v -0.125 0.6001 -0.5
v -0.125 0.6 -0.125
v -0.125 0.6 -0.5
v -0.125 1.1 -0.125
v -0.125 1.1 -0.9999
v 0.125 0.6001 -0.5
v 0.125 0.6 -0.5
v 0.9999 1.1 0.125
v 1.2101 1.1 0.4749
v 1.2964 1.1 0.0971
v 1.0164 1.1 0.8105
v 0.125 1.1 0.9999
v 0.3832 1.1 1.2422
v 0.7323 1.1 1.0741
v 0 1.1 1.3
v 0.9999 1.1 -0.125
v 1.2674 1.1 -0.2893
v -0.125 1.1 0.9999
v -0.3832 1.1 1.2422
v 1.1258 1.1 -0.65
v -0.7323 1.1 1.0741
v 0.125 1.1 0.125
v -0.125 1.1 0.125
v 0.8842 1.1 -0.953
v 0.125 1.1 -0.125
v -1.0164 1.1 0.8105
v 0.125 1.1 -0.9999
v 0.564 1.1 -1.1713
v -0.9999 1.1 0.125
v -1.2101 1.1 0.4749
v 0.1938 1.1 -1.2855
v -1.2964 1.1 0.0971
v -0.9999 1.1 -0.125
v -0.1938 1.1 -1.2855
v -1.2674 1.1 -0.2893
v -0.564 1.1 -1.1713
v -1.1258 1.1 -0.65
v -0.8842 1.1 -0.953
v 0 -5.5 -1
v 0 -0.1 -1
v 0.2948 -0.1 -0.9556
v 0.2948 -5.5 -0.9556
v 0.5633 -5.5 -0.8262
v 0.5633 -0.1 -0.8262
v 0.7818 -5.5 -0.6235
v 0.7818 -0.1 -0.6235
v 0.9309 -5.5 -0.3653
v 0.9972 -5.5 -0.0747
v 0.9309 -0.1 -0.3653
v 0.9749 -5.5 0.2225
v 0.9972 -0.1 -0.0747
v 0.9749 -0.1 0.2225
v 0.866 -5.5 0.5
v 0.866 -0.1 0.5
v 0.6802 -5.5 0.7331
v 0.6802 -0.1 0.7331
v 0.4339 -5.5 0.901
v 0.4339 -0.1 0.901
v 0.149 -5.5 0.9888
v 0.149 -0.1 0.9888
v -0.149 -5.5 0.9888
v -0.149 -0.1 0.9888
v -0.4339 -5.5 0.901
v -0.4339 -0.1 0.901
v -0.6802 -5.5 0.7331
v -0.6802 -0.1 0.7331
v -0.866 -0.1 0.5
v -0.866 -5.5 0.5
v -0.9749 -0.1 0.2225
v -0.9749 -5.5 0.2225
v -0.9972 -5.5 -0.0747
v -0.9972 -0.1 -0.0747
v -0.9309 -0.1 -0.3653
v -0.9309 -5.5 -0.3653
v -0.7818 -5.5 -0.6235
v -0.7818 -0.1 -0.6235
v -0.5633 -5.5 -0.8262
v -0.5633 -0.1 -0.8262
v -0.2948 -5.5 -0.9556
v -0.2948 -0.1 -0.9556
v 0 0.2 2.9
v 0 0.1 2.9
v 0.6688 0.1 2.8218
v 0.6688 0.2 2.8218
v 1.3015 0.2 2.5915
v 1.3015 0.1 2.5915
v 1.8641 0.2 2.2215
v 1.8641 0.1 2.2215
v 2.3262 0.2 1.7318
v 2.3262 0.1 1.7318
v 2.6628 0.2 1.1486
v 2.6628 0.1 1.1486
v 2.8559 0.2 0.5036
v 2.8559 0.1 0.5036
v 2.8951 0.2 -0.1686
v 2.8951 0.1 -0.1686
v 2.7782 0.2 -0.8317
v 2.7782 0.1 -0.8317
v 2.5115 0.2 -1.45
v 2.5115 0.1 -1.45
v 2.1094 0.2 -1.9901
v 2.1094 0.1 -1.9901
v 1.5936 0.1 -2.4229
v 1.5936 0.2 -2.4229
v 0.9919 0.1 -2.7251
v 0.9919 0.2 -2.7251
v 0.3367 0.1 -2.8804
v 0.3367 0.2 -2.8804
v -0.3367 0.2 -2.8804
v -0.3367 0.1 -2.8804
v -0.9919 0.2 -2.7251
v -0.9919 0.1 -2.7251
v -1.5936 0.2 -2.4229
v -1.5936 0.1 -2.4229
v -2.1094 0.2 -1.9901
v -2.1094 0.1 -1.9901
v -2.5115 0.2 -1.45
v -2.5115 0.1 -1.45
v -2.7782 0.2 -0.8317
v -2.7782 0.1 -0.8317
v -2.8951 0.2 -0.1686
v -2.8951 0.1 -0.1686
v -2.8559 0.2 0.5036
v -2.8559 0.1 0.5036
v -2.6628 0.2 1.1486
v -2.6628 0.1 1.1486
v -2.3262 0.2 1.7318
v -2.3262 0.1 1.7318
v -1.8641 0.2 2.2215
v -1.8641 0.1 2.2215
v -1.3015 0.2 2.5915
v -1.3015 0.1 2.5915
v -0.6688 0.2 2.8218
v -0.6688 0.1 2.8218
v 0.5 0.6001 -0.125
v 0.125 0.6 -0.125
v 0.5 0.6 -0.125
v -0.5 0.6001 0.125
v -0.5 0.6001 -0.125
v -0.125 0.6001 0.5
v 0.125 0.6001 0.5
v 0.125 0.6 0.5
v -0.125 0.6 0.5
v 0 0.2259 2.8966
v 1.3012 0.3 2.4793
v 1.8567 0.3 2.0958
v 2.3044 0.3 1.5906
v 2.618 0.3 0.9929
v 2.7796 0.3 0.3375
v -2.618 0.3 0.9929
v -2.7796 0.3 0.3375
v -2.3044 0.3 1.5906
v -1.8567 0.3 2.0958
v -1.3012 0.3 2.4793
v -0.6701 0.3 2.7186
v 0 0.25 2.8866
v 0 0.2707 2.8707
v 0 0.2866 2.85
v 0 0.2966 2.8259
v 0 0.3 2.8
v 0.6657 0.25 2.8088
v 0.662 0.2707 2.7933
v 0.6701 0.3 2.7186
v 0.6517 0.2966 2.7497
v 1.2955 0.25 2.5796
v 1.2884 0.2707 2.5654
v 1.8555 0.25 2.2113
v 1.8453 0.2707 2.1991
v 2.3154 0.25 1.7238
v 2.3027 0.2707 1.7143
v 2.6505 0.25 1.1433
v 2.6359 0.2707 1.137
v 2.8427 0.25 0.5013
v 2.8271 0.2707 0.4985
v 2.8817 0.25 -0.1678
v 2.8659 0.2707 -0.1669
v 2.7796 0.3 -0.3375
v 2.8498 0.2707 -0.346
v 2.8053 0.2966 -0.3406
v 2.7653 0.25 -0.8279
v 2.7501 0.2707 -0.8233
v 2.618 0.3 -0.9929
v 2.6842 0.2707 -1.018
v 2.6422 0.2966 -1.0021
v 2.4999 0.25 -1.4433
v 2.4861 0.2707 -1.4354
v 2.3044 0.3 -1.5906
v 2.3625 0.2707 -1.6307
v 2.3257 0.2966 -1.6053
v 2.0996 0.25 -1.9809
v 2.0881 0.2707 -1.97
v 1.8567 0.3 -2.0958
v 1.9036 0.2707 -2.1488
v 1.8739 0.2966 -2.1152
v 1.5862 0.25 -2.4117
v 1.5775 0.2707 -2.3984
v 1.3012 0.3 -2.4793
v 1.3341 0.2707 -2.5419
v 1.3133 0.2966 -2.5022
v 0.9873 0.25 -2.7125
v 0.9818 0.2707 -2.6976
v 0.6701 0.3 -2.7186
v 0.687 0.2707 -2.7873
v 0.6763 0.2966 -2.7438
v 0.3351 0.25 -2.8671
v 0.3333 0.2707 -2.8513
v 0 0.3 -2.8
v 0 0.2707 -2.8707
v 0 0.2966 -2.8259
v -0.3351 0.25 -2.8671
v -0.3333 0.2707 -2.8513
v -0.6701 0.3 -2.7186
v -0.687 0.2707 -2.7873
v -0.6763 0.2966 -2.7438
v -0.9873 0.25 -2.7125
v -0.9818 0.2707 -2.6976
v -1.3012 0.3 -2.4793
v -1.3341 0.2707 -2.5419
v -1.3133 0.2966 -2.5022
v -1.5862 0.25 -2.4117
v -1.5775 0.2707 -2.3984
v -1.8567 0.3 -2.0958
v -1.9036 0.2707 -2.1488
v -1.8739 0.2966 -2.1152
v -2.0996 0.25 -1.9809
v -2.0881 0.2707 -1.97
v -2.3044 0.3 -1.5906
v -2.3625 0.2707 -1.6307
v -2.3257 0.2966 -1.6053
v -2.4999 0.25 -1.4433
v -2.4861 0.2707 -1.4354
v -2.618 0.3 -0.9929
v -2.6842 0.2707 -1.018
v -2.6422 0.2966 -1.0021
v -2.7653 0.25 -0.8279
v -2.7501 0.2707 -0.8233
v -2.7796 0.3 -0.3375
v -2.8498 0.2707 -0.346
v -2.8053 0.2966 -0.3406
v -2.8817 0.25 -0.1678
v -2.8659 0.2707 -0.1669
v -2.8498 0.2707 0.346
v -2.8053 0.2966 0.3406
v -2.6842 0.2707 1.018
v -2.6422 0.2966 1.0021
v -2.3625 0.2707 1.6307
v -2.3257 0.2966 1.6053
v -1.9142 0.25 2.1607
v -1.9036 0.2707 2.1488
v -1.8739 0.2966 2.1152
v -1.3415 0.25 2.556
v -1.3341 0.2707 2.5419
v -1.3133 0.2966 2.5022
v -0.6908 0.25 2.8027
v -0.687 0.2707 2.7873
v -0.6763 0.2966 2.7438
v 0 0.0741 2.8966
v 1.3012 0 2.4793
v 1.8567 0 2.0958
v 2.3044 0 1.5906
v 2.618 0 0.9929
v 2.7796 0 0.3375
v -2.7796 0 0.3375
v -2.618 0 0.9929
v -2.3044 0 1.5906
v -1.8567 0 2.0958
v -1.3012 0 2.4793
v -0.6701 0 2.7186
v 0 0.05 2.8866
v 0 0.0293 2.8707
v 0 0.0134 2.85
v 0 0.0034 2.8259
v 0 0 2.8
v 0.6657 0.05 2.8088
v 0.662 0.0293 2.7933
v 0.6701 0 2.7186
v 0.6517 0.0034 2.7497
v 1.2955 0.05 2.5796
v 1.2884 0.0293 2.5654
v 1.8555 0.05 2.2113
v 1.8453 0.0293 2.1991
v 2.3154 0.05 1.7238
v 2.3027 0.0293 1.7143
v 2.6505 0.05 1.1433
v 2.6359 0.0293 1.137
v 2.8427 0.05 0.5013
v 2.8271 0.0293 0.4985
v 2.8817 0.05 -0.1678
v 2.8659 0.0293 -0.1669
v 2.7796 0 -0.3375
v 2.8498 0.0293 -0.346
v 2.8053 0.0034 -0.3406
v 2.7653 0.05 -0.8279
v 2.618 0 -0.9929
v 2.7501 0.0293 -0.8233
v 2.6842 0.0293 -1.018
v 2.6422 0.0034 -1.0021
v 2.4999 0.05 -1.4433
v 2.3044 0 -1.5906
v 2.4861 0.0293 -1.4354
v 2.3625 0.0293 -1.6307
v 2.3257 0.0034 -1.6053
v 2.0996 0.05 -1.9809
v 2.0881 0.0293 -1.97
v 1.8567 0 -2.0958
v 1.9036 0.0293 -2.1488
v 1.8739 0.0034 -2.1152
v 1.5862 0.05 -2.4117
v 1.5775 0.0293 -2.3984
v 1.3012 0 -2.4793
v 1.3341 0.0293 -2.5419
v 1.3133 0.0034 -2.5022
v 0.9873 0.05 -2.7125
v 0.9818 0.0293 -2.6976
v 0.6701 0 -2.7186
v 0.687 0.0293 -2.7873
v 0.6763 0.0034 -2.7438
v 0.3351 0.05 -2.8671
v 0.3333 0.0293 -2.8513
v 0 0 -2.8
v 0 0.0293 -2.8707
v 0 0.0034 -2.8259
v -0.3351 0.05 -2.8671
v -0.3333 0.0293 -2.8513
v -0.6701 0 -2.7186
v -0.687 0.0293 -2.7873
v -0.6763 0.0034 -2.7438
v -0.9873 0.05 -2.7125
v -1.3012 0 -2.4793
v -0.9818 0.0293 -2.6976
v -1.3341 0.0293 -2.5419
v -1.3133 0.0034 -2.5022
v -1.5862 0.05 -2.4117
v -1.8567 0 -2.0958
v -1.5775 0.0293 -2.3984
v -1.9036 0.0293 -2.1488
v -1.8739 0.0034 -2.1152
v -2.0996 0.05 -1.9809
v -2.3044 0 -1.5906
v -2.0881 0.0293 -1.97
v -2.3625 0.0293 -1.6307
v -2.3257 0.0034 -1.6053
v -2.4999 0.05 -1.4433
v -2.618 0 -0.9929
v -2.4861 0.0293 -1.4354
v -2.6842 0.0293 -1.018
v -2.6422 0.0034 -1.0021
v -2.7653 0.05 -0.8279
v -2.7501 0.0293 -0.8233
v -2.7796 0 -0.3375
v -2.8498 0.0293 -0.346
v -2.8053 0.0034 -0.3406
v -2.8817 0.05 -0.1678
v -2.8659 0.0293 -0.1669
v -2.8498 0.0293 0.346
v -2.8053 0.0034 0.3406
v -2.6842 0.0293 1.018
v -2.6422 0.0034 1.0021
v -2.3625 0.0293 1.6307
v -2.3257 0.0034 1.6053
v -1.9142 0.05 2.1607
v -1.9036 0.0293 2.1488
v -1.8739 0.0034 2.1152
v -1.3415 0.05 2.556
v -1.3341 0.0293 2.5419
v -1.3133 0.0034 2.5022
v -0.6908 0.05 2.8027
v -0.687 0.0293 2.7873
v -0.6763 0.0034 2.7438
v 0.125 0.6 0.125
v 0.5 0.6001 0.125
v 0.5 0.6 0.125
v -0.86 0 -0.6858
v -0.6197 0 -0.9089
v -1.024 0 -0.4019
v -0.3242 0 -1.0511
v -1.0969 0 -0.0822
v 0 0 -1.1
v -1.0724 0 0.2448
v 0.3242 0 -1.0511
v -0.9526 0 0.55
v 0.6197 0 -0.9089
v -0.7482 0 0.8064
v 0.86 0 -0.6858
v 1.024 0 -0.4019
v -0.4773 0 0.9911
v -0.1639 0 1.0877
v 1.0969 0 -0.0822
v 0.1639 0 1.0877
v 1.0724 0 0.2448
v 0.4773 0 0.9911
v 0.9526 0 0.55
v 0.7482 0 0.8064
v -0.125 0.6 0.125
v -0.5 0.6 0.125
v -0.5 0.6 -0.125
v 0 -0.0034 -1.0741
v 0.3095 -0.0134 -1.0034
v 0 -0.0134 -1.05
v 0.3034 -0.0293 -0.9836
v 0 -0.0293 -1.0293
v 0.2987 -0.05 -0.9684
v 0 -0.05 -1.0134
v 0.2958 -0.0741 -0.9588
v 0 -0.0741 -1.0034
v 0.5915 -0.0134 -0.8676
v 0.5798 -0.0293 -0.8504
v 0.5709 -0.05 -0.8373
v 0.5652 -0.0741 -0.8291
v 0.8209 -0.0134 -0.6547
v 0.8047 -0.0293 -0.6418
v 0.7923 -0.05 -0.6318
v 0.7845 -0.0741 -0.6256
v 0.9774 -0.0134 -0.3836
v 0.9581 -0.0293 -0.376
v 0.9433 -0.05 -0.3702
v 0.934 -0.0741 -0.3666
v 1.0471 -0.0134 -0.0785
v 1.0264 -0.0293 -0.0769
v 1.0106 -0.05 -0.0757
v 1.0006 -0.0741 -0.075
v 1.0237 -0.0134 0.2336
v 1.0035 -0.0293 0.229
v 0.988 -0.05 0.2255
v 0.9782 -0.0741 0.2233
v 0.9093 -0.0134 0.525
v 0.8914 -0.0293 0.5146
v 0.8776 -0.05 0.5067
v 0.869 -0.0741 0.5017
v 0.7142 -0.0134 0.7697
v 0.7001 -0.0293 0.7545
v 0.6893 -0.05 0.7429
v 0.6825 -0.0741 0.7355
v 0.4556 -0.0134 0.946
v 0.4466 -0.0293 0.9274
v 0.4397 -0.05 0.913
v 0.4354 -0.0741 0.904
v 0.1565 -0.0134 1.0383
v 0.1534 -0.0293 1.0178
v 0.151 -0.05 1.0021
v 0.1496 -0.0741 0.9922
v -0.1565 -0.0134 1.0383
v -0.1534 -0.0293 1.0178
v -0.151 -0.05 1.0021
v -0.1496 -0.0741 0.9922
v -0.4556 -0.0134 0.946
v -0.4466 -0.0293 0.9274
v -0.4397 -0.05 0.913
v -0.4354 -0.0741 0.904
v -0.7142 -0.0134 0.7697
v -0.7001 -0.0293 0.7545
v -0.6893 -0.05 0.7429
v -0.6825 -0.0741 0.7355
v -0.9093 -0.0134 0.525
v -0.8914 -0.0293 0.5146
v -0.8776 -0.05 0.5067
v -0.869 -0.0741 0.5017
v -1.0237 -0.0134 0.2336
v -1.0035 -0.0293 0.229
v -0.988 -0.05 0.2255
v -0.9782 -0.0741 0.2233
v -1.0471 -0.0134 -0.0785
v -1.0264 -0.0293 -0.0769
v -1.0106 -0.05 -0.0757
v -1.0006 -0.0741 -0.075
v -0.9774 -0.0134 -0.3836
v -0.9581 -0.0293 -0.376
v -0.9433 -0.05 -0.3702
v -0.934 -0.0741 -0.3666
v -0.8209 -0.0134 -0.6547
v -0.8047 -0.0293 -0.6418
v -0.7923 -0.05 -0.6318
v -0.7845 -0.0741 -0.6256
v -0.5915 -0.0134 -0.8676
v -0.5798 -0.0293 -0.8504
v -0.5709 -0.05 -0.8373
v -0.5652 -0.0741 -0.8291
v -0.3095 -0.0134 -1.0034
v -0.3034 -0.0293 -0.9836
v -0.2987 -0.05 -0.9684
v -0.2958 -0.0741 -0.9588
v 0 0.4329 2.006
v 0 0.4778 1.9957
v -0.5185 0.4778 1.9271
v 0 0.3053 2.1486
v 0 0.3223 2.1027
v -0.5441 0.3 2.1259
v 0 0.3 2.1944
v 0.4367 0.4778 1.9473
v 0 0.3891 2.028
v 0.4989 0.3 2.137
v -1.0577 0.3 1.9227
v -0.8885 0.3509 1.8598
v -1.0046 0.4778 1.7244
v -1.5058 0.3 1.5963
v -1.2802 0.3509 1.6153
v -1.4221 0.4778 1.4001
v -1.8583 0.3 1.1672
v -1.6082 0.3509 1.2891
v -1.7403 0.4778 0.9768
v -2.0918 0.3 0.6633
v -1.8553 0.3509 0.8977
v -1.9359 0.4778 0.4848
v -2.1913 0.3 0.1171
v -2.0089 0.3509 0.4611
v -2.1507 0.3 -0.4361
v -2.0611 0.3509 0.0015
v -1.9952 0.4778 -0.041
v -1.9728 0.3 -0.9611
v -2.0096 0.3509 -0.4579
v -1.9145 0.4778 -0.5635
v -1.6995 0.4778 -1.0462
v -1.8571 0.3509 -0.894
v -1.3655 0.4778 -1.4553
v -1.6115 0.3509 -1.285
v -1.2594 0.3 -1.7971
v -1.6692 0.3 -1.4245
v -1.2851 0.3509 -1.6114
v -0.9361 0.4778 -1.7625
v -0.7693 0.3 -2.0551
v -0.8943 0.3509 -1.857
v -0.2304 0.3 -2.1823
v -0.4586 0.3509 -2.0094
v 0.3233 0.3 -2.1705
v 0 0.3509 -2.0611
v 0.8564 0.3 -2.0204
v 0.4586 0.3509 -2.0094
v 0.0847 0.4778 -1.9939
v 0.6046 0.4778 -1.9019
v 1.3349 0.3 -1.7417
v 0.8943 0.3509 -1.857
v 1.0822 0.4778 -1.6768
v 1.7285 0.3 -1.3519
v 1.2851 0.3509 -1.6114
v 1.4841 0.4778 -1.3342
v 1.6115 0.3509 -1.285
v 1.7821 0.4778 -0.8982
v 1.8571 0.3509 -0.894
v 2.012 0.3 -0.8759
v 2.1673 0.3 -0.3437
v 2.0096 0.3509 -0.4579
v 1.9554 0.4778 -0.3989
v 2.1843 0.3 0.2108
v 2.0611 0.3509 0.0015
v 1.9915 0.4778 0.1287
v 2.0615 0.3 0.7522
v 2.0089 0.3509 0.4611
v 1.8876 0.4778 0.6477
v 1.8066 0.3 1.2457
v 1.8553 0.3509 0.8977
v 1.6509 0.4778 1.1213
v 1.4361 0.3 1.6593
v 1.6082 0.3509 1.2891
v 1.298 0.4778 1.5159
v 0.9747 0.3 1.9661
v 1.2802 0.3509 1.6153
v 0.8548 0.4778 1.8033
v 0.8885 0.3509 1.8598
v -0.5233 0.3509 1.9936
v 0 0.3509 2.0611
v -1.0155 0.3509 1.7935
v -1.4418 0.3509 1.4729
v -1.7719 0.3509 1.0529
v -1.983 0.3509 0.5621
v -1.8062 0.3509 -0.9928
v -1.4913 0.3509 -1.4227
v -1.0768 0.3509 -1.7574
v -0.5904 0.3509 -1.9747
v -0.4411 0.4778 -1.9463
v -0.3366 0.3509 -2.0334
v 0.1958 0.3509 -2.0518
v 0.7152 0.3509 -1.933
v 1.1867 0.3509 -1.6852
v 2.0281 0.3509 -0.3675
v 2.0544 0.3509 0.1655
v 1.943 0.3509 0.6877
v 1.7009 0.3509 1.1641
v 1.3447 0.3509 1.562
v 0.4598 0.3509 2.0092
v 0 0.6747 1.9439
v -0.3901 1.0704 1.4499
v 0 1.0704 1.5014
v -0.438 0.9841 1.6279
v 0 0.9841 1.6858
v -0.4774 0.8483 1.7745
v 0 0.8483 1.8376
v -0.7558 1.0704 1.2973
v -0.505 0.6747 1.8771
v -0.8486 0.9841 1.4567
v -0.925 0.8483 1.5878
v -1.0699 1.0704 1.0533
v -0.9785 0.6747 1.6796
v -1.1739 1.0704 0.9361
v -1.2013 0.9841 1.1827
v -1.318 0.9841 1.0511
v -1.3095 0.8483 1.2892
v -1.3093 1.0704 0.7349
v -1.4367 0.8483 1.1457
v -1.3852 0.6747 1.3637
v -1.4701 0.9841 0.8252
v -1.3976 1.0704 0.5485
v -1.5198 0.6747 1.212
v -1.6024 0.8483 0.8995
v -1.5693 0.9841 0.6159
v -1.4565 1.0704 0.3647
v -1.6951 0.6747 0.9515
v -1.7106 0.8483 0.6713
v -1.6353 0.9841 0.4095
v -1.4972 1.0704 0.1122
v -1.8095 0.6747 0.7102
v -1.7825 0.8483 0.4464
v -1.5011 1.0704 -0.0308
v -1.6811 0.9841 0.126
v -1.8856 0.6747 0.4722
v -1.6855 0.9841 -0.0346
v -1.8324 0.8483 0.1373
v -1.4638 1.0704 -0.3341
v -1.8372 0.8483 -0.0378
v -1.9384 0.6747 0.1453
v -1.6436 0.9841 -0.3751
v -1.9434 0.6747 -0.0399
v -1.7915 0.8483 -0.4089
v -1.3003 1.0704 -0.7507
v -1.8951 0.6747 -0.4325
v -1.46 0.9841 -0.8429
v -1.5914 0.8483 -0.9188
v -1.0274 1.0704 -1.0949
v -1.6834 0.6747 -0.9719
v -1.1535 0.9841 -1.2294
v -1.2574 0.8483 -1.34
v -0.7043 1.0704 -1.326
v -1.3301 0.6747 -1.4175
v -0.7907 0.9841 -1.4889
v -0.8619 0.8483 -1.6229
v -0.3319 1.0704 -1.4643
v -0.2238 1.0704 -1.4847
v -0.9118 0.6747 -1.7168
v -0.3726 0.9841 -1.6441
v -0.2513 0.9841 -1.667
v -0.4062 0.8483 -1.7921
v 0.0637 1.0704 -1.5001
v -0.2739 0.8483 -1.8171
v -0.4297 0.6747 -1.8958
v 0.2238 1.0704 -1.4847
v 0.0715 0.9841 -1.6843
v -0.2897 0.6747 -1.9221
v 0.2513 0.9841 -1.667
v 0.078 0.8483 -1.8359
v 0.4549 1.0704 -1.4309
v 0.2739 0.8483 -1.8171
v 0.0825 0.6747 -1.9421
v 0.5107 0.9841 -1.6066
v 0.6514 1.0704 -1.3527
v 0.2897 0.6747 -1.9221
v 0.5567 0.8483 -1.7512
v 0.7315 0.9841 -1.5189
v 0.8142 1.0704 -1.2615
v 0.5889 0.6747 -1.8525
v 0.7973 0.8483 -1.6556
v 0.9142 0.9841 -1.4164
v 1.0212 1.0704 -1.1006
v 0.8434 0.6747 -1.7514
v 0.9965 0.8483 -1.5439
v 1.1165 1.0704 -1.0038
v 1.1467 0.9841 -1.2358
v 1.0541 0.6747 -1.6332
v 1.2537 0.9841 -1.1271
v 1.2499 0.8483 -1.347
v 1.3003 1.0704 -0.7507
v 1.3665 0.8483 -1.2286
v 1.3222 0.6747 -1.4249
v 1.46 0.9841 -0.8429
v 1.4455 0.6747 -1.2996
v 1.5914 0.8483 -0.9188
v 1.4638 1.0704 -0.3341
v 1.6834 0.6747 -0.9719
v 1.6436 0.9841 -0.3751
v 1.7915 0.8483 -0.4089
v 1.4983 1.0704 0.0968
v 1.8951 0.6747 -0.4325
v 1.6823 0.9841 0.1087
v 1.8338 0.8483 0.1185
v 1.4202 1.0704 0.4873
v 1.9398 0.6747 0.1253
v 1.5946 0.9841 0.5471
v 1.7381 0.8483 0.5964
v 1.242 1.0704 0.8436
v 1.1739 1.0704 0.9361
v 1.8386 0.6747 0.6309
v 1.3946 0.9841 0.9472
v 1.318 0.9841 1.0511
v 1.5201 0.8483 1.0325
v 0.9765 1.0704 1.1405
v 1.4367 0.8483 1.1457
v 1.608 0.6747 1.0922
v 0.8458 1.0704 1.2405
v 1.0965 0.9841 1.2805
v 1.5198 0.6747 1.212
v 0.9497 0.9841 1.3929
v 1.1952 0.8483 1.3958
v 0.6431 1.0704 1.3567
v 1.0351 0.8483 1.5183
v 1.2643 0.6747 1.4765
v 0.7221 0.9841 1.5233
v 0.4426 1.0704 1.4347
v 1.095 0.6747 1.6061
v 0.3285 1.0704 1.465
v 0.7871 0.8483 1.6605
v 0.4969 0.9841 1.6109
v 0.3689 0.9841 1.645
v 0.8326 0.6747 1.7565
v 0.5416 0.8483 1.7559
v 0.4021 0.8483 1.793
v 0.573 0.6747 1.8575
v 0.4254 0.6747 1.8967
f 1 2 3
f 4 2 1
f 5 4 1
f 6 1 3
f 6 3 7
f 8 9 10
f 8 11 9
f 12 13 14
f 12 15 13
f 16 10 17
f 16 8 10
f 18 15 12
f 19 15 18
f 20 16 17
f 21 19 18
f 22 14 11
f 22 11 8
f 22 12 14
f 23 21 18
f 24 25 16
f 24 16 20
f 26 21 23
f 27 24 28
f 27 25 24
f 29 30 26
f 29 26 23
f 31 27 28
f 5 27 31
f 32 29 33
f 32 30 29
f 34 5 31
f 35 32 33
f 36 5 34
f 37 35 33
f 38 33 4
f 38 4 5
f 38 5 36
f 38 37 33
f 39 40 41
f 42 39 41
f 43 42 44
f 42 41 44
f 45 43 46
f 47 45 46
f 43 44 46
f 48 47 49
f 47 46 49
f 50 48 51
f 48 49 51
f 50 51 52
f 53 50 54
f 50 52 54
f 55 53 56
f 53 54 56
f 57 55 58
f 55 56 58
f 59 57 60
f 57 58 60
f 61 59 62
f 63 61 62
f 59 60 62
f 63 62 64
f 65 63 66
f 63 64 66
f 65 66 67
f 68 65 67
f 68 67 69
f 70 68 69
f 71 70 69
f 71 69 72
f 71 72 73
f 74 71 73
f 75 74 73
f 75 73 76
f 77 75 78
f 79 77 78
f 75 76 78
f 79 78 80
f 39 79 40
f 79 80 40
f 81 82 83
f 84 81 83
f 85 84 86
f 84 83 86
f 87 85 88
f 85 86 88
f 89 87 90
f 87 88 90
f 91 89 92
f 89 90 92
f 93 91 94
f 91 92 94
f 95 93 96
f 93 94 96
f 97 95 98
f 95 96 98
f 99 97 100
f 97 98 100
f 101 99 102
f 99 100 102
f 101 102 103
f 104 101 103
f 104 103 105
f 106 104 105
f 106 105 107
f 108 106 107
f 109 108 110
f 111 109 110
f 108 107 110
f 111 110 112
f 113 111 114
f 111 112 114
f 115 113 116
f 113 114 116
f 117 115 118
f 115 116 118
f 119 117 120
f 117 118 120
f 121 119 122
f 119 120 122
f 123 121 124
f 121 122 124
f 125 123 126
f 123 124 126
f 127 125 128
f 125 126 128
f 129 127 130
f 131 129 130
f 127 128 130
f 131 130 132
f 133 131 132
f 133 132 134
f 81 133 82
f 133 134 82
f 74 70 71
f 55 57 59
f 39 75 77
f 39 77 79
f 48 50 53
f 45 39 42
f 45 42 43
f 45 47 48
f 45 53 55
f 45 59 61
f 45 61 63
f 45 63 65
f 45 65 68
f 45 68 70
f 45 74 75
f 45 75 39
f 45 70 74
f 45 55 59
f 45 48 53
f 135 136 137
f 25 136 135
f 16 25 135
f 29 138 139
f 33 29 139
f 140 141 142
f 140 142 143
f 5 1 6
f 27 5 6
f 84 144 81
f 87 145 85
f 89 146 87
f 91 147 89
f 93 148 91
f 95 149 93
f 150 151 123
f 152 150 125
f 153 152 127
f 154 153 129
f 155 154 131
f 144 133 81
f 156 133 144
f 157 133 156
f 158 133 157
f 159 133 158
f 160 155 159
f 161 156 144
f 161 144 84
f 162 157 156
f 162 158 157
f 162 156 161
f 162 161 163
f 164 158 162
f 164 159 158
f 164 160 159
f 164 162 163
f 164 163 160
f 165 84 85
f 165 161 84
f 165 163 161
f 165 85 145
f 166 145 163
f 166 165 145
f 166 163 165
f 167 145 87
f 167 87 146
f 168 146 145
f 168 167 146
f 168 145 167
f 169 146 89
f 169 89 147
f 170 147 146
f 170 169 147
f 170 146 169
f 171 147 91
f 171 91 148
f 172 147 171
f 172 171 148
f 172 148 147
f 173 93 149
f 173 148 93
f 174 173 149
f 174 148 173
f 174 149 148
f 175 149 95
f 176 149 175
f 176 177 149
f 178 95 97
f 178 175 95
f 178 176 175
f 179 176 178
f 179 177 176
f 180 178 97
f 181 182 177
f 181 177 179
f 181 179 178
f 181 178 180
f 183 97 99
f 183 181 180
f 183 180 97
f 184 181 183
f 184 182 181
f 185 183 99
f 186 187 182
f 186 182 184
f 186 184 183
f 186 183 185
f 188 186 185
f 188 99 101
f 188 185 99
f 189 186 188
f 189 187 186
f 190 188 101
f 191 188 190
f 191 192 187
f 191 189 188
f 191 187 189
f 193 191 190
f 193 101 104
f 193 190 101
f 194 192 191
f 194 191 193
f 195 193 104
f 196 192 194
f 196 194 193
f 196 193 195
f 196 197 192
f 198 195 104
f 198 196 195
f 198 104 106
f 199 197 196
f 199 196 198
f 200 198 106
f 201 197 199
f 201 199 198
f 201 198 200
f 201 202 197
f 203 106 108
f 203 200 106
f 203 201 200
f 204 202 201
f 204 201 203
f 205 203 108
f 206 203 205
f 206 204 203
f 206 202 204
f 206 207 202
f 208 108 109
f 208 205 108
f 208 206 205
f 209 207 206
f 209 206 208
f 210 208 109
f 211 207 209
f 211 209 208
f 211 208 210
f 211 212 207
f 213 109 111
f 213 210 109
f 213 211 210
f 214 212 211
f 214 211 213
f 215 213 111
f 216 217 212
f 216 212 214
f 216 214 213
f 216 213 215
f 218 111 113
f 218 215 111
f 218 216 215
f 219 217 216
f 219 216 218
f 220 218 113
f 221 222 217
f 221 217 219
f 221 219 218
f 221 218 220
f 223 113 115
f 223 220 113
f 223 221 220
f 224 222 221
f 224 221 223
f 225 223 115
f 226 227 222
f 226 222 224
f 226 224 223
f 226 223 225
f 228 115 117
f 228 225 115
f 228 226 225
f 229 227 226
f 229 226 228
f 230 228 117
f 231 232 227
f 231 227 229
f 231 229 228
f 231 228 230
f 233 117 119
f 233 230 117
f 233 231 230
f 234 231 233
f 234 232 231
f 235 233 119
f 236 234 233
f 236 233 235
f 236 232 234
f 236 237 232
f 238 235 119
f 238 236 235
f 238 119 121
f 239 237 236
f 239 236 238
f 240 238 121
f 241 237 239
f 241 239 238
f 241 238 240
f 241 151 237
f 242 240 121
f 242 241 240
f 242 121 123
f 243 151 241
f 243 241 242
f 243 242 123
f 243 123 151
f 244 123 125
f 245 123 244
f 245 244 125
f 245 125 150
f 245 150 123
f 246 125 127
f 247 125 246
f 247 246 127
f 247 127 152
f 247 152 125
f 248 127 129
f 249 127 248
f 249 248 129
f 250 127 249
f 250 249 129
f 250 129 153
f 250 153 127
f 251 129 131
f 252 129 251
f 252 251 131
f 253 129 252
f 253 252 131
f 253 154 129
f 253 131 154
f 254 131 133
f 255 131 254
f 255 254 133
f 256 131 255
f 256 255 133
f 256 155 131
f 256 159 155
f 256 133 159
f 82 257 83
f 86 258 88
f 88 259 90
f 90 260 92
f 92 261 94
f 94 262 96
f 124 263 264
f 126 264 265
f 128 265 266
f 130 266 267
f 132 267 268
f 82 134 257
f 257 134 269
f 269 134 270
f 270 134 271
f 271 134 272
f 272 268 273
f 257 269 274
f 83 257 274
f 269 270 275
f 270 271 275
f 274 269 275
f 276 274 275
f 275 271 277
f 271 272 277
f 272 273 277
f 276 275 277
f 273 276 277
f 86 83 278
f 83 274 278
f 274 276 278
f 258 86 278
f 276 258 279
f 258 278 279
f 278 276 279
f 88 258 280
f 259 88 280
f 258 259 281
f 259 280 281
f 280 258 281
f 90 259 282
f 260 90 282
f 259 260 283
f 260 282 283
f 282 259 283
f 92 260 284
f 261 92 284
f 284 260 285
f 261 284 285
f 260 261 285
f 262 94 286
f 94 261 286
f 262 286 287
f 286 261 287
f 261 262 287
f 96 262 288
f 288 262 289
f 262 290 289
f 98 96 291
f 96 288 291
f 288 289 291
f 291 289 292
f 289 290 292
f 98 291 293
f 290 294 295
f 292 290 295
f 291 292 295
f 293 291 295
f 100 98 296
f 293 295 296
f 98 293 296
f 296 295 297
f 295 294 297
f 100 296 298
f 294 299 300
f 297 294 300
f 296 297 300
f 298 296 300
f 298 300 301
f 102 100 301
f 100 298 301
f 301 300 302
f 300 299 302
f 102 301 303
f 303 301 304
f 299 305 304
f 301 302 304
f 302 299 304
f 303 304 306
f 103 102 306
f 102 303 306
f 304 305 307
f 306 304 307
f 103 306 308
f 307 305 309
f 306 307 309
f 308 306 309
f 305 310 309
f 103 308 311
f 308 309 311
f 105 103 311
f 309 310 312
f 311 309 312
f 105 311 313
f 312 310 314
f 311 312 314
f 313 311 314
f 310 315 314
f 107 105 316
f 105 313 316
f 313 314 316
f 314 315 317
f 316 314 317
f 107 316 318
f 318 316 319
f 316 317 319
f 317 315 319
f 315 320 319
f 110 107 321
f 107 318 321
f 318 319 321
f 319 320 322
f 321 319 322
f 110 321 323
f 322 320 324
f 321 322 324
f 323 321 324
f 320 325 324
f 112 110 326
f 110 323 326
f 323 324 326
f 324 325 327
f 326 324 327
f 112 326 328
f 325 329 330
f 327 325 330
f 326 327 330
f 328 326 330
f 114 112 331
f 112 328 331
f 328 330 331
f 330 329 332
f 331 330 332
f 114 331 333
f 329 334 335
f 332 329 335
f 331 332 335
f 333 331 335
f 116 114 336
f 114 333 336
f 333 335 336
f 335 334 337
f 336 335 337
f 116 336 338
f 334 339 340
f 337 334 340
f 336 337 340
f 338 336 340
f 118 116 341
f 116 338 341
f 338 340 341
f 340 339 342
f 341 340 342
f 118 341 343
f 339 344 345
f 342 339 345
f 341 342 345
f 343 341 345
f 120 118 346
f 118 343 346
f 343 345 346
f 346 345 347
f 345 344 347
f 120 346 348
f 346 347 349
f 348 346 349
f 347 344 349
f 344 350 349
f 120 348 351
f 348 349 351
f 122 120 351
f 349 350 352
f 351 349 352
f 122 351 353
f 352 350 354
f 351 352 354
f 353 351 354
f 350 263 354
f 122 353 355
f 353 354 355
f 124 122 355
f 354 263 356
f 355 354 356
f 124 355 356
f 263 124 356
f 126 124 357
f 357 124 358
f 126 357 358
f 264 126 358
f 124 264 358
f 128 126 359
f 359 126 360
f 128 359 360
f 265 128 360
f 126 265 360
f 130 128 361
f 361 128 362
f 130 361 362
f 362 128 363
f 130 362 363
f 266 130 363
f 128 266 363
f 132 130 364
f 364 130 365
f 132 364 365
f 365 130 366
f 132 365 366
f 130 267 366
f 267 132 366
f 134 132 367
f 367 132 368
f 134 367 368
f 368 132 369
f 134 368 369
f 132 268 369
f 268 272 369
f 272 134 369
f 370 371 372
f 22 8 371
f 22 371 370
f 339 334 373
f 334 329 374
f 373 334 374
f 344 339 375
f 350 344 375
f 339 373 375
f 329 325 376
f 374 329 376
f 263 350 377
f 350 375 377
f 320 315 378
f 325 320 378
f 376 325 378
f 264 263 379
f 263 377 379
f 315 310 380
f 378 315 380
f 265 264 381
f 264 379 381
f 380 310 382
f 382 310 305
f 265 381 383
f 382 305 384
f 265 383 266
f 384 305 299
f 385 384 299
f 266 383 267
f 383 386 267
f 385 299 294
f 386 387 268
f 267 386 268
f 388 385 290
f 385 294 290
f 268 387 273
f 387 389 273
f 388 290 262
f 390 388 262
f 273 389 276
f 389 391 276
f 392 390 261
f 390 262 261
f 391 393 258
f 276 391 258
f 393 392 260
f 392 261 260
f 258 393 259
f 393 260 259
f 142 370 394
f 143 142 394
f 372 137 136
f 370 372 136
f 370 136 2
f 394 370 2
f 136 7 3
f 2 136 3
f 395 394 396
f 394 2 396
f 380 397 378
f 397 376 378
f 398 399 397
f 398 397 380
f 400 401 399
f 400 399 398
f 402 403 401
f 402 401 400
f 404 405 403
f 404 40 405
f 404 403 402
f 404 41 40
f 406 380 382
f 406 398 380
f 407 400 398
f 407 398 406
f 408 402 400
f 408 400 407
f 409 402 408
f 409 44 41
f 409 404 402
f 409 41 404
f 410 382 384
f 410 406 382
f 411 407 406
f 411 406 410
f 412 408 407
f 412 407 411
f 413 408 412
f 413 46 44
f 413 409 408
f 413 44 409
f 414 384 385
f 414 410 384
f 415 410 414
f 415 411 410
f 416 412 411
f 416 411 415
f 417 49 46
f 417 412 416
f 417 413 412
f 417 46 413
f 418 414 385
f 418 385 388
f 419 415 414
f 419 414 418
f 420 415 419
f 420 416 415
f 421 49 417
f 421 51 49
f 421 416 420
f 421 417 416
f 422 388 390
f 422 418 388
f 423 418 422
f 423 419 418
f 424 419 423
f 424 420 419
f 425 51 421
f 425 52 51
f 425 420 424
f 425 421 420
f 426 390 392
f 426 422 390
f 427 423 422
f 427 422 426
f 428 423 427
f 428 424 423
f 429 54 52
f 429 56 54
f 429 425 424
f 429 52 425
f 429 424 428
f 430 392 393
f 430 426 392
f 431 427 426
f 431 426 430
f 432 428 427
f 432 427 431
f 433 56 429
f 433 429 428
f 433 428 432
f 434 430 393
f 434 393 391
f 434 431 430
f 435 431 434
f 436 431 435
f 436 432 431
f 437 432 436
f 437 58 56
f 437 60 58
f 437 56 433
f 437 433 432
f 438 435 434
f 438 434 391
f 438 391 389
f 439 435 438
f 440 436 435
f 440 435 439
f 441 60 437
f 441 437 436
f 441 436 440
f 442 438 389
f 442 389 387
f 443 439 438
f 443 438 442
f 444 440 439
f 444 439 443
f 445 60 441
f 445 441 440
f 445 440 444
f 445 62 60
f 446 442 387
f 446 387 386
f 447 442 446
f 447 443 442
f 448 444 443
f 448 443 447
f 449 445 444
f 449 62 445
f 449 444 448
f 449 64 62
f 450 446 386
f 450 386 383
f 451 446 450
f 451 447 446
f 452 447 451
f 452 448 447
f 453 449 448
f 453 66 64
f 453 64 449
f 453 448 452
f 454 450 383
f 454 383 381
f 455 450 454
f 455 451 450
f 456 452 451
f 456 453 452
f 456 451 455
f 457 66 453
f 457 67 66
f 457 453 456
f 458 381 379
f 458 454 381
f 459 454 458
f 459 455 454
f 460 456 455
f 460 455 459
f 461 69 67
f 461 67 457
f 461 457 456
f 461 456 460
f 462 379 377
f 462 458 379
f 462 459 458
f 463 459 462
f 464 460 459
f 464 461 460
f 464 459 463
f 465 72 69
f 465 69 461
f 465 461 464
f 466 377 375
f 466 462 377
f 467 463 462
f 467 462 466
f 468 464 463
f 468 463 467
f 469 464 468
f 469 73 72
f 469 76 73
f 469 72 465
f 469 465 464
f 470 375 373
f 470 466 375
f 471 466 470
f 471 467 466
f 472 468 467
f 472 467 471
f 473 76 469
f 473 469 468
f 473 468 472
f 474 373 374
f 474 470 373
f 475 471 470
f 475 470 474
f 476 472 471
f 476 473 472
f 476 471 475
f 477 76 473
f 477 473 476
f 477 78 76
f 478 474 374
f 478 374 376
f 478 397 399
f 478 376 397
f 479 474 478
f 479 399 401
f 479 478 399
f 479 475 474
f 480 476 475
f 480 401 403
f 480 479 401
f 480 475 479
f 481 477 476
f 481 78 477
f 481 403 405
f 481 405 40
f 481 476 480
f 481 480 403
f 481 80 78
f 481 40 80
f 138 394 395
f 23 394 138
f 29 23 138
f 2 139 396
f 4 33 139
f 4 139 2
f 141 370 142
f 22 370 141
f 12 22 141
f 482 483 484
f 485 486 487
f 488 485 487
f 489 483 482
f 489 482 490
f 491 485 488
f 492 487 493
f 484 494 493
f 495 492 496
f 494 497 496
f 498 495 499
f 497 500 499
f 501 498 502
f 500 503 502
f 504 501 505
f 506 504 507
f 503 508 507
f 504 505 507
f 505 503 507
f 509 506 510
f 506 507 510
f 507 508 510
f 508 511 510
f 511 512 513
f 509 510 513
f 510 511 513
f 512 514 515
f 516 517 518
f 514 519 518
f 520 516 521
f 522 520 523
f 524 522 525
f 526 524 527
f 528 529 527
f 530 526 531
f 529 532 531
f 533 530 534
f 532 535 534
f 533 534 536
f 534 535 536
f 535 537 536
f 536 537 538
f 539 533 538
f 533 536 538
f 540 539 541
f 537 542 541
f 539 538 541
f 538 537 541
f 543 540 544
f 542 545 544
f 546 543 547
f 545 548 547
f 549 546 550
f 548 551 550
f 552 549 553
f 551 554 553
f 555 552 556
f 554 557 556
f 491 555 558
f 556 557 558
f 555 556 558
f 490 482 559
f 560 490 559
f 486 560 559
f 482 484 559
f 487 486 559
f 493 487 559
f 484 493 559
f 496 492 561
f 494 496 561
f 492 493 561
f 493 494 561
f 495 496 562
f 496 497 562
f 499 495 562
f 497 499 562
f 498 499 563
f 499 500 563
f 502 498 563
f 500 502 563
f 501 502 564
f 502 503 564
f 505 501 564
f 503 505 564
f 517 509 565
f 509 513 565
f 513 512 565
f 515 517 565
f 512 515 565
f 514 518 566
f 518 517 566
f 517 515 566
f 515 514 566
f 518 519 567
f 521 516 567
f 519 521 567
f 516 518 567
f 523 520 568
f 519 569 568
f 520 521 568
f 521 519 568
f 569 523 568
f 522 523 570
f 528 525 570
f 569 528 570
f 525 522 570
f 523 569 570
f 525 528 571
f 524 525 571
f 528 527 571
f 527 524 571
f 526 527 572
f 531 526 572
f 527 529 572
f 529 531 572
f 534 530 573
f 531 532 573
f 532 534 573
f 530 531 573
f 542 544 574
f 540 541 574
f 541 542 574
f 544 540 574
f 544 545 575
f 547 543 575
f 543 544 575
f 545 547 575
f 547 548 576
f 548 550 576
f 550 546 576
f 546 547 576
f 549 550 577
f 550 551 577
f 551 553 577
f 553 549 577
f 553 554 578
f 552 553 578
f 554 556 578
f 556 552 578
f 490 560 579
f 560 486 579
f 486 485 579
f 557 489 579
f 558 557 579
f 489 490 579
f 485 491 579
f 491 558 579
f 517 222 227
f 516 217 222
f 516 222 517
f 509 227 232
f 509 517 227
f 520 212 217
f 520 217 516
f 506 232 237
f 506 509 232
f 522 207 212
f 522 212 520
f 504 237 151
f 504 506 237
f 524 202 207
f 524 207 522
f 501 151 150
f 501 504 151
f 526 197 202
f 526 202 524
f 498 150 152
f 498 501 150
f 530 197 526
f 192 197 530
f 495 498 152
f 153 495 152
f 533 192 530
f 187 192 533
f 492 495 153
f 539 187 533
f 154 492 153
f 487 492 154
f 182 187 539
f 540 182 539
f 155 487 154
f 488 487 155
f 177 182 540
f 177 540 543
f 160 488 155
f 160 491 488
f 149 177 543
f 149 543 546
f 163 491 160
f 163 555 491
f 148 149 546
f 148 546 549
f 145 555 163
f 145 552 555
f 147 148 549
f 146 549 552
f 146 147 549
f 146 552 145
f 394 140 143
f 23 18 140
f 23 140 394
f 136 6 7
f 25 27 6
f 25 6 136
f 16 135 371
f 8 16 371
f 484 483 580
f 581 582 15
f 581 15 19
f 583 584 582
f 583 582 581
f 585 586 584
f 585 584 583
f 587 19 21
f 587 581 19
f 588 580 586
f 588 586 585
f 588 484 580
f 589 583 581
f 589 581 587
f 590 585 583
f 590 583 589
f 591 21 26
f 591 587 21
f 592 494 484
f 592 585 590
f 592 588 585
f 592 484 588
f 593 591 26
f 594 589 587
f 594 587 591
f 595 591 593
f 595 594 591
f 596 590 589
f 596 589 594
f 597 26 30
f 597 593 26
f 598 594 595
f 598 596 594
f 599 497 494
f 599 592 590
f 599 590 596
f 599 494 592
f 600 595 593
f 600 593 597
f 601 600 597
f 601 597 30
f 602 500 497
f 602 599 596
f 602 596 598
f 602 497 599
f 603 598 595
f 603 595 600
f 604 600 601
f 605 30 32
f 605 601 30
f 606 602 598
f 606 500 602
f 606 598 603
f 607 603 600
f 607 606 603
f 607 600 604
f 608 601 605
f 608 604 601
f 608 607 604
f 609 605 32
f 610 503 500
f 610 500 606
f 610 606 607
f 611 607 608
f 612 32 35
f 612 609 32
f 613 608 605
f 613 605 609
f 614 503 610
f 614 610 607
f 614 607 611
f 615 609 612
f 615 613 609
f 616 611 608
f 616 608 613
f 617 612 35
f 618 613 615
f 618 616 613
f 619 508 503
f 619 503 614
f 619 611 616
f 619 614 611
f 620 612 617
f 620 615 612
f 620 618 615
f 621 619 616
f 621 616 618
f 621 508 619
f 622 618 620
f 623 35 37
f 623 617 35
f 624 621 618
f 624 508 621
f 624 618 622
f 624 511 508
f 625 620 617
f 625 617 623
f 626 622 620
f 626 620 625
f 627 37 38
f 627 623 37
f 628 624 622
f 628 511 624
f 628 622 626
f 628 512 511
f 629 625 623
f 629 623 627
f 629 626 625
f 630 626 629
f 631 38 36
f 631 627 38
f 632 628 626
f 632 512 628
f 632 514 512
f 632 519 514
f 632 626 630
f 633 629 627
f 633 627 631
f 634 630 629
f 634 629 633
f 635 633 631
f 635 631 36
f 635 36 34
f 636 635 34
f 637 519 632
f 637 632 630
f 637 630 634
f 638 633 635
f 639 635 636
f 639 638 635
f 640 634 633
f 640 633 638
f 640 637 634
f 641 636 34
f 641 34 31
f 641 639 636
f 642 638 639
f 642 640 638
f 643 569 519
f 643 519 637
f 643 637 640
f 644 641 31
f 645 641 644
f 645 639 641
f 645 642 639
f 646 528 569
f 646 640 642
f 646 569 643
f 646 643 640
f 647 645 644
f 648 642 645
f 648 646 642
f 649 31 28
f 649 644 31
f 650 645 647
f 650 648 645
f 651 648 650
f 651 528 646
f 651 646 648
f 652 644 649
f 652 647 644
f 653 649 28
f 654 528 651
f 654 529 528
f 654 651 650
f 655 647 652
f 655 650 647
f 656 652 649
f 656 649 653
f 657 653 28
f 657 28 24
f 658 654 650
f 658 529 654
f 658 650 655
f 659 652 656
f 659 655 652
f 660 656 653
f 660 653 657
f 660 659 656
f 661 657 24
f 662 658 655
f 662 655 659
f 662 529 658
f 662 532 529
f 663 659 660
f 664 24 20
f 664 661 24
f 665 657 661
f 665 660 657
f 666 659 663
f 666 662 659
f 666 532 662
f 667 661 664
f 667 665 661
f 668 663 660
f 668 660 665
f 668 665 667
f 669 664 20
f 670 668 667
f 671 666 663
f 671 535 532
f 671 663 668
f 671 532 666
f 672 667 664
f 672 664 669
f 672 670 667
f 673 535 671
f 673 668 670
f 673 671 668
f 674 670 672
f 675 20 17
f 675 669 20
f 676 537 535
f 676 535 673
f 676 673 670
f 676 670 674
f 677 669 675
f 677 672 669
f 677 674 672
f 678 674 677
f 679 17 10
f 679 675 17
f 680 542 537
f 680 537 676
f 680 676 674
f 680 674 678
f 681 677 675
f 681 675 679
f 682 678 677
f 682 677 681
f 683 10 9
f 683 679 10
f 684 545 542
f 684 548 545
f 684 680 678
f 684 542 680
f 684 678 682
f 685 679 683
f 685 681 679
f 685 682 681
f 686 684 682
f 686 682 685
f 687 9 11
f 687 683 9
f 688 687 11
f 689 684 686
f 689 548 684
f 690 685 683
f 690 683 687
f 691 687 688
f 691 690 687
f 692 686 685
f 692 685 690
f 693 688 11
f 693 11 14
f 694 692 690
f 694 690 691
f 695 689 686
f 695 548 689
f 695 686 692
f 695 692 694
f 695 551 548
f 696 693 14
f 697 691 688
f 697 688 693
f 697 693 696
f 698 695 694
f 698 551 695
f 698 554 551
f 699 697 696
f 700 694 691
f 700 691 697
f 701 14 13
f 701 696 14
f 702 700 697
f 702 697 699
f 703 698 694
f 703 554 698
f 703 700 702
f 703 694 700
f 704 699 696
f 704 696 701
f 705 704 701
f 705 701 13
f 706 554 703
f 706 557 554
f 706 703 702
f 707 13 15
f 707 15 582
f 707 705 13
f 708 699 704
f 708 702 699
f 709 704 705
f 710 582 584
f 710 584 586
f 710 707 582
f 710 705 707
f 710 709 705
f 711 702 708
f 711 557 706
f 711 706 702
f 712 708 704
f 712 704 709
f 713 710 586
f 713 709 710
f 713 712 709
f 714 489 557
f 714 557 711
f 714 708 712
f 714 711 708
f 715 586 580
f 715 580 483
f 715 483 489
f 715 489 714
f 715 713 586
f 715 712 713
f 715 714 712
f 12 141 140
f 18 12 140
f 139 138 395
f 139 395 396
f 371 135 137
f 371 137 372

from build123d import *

# Parameters (mm, degrees)
SKETCH2_R           = 2.9
BOSS_EXTRUDE1_DEPTH = 0.3
FILLET1_R           = 0.1
SKETCH4_R           = 1
BOSS_EXTRUDE2_DEPTH = 5.5
CUT_EXTRUDE1_DEPTH  = 0.5
CHAMFER2_SIZE       = 0.5
FILLET2_R           = 0.2
FILLET3_R           = 0.1
FILLET4_R           = 0.1


with BuildPart() as part:
    # Sketch2 → Boss-Extrude1 (new body)
    with BuildSketch(Plane(origin=(0, 0, 0), x_dir=(1, 0, 0), z_dir=(0, 1, 0))):
        with Locations(Location((0, 0, 0), (0, 0, 270))):
            Circle(SKETCH2_R)
    extrude(amount=BOSS_EXTRUDE1_DEPTH)

    # Fillet1
    fillet1_edges = [part.edges().sort_by_distance(p)[0] for p in [
        (0, 0.3, -2.9),
    ]]
    fillet(fillet1_edges, radius=FILLET1_R)

    # Sketch3 → Revolve1 (revolve)
    with BuildSketch(Plane.XY, mode=Mode.PRIVATE) as revolve1_sk:
        with BuildLine():
            Line((2, 0.3), (0, 0.3))
            Line((0, 0.3), (0, 1.1))
            Line((0, 1.1), (1.3, 1.1))
            ThreePointArc((1.3, 1.1), (1.794974747, 0.894974747), (2, 0.4))
            Line((2, 0.4), (2, 0.3))
        make_face()
    revolve(revolve1_sk.sketch.rotate(Axis((0, 0, 0), (0, -1, 0)), 90), axis=Axis((0, 0, 0), (0, -1, 0)))

    # Sketch4 → Boss-Extrude2 (add)
    with BuildSketch(Plane.XZ):
        with Locations(Location((0, 0, 0), (0, 0, 270))):
            Circle(SKETCH4_R)
    extrude(amount=BOSS_EXTRUDE2_DEPTH)

    # Sketch5 → Cut-Extrude1 (cut)
    with BuildSketch(Plane(origin=(0, 1.1, 0), x_dir=(1, 0, 0), z_dir=(0, 1, 0))):
        Polygon((-0.125, 0.5), (0.125, 0.5), (0.125, 0.125), (0.5, 0.125), (0.5, -0.125), (0.125, -0.125), (0.125, -0.5), (-0.125, -0.5), (-0.125, -0.125), (-0.5, -0.125), (-0.5, 0.125), (-0.125, 0.125), align=None)
    extrude(amount=-CUT_EXTRUDE1_DEPTH, mode=Mode.SUBTRACT)

    # Chamfer2
    chamfer2_edges = [part.edges().sort_by_distance(p)[0] for p in [
        (-0.5, 1.1, 0),
        (0, 1.1, 0.5),
        (0.5, 1.1, 0),
        (0, 1.1, -0.5),
    ]]
    chamfer(chamfer2_edges, length=CHAMFER2_SIZE - 0.0001)  # a hair under: the kernel refuses the full size

    # Fillet2
    fillet2_edges = [part.edges().sort_by_distance(p)[0] for p in [
        (0, 0.3, -2),
    ]]
    fillet(fillet2_edges, radius=FILLET2_R)

    # Fillet3
    fillet3_edges = [part.edges().sort_by_distance(p)[0] for p in [
        (0, 0, -2.9),
    ]]
    fillet(fillet3_edges, radius=FILLET3_R)

    # Fillet4
    fillet4_edges = [part.edges().sort_by_distance(p)[0] for p in [
        (0, 0, 1),
    ]]
    fillet(fillet4_edges, radius=FILLET4_R)


solid = part.part
